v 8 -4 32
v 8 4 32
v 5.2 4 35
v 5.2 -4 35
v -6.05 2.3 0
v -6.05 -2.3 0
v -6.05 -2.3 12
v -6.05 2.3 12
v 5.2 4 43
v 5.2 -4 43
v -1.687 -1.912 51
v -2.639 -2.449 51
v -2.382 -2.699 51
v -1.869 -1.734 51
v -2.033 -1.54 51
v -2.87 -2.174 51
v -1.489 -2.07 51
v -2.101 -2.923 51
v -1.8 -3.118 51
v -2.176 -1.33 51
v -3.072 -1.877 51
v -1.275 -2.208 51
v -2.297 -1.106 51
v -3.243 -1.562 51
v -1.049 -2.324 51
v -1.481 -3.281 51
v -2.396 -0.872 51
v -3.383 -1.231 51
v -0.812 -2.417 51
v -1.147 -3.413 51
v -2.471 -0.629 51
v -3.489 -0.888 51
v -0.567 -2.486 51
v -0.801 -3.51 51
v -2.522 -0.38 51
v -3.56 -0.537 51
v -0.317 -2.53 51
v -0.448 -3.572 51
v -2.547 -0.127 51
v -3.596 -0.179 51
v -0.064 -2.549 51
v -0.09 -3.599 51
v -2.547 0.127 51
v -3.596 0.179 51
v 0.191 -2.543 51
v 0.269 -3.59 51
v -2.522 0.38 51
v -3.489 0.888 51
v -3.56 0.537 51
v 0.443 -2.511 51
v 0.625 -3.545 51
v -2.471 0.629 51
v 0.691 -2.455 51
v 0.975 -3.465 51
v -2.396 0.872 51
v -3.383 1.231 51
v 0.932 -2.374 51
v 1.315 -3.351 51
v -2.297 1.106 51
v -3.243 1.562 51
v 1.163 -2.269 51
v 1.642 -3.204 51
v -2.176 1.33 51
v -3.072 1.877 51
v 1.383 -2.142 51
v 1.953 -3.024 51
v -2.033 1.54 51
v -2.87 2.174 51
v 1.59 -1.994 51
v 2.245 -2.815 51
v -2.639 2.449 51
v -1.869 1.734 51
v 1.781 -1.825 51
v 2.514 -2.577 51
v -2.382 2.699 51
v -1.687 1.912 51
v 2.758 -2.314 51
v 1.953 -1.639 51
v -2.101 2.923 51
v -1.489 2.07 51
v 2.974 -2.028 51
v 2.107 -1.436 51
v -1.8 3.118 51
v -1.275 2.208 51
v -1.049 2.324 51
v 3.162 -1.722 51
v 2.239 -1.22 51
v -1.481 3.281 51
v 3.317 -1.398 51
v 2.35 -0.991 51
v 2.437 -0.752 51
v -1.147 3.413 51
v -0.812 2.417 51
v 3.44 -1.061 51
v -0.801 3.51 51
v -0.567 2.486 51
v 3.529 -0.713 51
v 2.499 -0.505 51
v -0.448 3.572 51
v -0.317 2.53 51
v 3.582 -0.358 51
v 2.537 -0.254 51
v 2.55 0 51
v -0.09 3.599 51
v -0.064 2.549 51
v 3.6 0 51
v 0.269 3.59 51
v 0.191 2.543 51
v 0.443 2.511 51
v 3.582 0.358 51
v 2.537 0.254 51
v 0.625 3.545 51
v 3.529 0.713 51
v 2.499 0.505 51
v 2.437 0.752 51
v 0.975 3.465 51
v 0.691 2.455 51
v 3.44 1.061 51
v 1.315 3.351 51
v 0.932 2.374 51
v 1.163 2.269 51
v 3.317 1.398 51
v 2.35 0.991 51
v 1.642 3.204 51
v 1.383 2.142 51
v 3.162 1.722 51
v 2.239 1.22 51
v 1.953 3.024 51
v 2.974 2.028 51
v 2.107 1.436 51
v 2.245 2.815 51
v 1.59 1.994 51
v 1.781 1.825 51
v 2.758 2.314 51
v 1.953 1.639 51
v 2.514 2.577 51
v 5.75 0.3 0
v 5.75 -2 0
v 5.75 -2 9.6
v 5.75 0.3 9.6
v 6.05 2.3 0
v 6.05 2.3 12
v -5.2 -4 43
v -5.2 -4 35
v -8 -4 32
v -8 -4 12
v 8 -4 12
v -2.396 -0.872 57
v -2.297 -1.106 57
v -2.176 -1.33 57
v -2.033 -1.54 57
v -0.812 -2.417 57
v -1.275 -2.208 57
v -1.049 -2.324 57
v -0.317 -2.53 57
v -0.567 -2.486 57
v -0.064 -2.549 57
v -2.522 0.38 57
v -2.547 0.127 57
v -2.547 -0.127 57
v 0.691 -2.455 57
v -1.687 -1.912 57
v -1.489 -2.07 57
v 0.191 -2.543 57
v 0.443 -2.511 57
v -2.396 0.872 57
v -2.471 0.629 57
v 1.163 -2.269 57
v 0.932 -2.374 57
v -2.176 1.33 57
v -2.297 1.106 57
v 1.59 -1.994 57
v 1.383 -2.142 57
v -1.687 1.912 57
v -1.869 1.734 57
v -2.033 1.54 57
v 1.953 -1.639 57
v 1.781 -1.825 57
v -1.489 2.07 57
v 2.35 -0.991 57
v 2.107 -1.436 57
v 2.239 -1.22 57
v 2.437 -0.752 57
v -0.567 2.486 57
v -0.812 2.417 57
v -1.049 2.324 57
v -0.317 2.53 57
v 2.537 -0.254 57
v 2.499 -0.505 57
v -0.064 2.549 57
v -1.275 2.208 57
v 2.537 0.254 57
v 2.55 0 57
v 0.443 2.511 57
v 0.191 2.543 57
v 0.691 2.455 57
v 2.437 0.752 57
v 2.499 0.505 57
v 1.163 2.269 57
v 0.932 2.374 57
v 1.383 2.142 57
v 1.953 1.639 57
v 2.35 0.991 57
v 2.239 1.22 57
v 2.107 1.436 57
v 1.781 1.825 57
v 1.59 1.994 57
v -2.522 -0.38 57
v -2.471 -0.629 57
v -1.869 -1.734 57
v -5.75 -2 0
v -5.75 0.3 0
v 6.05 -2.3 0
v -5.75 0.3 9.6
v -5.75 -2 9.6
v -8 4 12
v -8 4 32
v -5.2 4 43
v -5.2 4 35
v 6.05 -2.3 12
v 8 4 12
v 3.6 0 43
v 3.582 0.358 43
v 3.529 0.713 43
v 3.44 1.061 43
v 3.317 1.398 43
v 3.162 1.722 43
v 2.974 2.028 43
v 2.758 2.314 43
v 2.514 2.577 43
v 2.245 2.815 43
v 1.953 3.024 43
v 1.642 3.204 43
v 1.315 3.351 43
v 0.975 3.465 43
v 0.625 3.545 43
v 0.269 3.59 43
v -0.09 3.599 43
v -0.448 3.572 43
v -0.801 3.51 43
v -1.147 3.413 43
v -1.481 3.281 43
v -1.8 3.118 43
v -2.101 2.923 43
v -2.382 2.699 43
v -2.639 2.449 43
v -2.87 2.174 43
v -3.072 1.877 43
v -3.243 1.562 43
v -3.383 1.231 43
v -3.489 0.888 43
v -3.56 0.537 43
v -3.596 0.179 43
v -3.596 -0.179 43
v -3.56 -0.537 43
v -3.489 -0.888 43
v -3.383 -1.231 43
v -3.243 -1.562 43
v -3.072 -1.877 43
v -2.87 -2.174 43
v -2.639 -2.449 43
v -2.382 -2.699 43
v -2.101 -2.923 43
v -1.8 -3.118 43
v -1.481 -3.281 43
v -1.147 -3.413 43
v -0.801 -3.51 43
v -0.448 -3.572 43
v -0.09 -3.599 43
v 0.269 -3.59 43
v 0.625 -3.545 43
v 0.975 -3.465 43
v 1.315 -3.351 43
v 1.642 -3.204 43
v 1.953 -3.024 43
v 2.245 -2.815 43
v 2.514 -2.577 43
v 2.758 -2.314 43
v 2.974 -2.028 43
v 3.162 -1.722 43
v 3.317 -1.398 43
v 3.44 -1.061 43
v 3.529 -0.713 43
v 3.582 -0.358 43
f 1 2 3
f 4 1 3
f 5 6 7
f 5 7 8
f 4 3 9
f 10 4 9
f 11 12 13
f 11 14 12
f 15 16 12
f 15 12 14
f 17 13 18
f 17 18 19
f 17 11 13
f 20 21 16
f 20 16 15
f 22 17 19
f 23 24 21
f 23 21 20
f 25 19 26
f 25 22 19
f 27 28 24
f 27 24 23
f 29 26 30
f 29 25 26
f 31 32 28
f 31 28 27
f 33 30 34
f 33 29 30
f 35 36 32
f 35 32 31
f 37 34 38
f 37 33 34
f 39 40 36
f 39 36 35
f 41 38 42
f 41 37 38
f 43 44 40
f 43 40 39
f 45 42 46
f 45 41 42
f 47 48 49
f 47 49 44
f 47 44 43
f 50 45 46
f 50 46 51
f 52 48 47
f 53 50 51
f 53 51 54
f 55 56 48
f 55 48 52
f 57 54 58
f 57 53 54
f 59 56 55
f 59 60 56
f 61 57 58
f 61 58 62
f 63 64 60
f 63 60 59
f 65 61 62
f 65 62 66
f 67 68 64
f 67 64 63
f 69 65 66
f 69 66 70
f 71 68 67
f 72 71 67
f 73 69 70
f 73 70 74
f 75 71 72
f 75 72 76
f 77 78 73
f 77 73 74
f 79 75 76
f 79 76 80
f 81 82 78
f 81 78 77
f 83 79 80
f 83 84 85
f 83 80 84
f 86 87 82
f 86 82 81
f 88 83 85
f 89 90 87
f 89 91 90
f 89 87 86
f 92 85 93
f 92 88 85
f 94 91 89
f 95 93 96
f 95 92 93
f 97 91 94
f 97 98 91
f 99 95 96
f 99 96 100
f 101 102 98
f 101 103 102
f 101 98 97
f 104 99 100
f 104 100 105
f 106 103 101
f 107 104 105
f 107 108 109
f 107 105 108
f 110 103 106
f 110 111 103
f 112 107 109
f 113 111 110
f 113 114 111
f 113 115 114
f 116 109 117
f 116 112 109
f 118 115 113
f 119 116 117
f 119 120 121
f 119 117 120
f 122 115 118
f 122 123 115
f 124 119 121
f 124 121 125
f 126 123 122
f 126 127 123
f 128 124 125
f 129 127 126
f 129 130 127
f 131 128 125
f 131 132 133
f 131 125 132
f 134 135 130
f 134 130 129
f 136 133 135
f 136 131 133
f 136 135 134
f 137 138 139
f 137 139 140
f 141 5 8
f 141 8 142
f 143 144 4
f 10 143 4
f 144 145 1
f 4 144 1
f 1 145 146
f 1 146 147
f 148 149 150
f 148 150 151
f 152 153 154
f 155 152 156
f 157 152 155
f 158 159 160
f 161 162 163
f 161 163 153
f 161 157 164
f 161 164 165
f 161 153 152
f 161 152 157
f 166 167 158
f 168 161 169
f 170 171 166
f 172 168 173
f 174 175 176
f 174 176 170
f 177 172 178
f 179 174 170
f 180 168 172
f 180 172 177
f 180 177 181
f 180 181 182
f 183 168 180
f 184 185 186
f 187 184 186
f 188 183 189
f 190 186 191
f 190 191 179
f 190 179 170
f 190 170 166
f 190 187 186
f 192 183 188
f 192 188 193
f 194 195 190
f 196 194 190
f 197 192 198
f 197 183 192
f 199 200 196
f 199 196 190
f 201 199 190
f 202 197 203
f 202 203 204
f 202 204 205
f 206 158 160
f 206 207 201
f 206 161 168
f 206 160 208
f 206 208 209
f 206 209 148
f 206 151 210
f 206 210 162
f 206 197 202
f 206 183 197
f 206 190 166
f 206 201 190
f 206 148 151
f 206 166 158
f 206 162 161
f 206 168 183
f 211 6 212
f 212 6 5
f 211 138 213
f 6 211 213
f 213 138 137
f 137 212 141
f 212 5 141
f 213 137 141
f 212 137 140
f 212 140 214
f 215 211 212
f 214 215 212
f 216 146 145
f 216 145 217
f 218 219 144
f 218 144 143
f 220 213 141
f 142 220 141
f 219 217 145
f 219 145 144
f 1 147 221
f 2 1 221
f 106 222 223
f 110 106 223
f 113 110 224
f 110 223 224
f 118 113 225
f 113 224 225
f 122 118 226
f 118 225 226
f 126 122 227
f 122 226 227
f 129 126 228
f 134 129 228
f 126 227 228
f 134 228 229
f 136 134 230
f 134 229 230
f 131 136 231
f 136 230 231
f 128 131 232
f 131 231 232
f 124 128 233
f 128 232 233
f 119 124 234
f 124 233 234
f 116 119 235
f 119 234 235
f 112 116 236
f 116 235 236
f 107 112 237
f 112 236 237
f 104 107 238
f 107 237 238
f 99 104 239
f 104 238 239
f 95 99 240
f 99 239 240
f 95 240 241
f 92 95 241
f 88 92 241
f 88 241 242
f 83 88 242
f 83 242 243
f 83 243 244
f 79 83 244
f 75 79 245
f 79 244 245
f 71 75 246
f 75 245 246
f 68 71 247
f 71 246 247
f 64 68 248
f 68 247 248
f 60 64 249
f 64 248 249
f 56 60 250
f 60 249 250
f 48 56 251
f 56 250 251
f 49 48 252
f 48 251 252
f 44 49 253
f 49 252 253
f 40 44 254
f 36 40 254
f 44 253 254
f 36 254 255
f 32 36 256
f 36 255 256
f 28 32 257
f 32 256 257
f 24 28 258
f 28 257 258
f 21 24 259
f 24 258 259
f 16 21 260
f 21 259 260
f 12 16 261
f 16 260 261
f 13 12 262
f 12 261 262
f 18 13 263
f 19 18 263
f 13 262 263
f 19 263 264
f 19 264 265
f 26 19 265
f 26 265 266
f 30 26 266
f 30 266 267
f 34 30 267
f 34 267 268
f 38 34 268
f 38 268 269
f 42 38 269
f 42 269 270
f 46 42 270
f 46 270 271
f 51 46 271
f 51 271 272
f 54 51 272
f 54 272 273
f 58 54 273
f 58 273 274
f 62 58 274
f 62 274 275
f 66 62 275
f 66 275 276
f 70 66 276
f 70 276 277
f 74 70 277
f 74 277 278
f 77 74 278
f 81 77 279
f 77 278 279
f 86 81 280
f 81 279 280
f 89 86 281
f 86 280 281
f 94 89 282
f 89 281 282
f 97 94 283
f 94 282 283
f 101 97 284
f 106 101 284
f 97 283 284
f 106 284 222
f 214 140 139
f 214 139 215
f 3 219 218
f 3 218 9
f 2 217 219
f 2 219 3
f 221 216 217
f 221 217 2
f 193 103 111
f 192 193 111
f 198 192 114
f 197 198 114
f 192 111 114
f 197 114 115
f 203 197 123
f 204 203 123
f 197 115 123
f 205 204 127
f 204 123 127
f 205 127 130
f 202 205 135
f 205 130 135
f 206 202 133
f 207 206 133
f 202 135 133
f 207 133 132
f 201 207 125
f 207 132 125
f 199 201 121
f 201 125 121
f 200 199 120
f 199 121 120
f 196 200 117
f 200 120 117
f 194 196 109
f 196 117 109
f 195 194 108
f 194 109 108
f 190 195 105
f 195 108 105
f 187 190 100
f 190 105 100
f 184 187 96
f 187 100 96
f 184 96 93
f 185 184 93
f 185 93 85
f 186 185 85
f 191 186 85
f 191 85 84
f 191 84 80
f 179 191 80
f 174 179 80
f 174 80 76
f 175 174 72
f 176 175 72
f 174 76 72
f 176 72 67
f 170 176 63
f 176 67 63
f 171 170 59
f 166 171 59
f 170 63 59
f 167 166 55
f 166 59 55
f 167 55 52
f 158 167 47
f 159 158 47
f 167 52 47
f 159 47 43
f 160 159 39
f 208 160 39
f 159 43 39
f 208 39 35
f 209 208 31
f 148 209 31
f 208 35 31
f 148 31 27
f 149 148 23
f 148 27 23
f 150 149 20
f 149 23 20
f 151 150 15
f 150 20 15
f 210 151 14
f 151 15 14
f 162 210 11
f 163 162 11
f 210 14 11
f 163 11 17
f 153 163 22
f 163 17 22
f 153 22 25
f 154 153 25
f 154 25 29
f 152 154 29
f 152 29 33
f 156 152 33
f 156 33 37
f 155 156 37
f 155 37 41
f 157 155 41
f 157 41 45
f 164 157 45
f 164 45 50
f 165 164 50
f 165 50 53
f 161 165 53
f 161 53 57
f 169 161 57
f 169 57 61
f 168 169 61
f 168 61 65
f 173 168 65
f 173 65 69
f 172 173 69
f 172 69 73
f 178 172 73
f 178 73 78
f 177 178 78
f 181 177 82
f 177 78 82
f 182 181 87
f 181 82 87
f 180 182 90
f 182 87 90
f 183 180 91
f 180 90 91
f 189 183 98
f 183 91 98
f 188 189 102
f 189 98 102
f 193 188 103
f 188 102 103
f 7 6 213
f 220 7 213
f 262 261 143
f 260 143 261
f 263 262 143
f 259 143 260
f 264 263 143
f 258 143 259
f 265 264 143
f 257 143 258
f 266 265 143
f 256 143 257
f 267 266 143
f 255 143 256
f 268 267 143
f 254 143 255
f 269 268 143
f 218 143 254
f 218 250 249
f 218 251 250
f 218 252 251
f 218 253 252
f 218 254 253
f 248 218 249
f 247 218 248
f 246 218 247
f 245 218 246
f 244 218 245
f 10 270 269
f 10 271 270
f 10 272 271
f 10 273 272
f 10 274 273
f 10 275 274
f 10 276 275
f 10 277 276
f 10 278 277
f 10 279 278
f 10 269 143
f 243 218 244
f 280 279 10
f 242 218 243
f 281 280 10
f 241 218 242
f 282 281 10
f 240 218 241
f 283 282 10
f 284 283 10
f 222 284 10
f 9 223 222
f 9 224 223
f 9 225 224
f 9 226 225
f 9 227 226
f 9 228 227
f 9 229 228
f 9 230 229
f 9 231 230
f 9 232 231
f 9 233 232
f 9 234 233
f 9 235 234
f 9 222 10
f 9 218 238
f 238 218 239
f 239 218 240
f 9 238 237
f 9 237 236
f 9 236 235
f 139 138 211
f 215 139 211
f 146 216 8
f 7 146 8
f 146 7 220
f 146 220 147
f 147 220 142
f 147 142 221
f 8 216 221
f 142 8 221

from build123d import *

# Parameters (mm, degrees)
ESQUISSE1_W             = 12.1
ESQUISSE1_H             = 4.6
BOSS_EXTRU_1_DEPTH      = 12
ESQUISSE3_W             = 11.5
ESQUISSE3_H             = 2.3
ENL_V_MAT_EXTRU_1_DEPTH = 9.6
ESQUISSE2_W             = 16
ESQUISSE2_H             = 8
BOSS_EXTRU_2_DEPTH      = 31
ENL_V_MAT_EXTRU_2_DEPTH = 45.463468151
ESQUISSE5_R             = 3.6
BOSS_EXTRU_3_DEPTH      = 8
ESQUISSE6_R             = 2.55
BOSS_EXTRU_4_DEPTH      = 6


with BuildPart() as part:
    # Esquisse1 → Boss.-Extru.1 (new body)
    with BuildSketch(Plane.XY):
        Rectangle(ESQUISSE1_W, ESQUISSE1_H)
    extrude(amount=BOSS_EXTRU_1_DEPTH)

    # Esquisse3 → Enlèv. mat.-Extru.1 (cut)
    with BuildSketch(Plane(origin=(0, 0, 0), x_dir=(-1, 0, 0), z_dir=(0, 0, -1))):
        with Locations((0, -0.85)):
            Rectangle(ESQUISSE3_W, ESQUISSE3_H)
    extrude(amount=-ENL_V_MAT_EXTRU_1_DEPTH, mode=Mode.SUBTRACT)

    # Esquisse2 → Boss.-Extru.2 (add)
    with BuildSketch(Plane.XY.offset(12)):
        Rectangle(ESQUISSE2_W, ESQUISSE2_H)
    extrude(amount=BOSS_EXTRU_2_DEPTH)

    # Esquisse4 → Enlèv. mat.-Extru.2 (cut, through all)
    with BuildSketch(Plane(origin=(0, 4, 0), x_dir=(1, 0, 0), z_dir=(0, 1, 0))):
        Polygon((-8, -43), (-8, -32), (-5.2, -35), (-5.2, -43), align=None)
        Polygon((5.2, -43), (8, -43), (8, -32), (5.2, -35), align=None)
    extrude(amount=-ENL_V_MAT_EXTRU_2_DEPTH, mode=Mode.SUBTRACT)

    # Esquisse5 → Boss.-Extru.3 (add)
    with BuildSketch(Plane.XY.offset(43)):
        Circle(ESQUISSE5_R)
    extrude(amount=BOSS_EXTRU_3_DEPTH)

    # Esquisse6 → Boss.-Extru.4 (add)
    with BuildSketch(Plane.XY.offset(51)):
        Circle(ESQUISSE6_R)
    extrude(amount=BOSS_EXTRU_4_DEPTH)


solid = part.part
